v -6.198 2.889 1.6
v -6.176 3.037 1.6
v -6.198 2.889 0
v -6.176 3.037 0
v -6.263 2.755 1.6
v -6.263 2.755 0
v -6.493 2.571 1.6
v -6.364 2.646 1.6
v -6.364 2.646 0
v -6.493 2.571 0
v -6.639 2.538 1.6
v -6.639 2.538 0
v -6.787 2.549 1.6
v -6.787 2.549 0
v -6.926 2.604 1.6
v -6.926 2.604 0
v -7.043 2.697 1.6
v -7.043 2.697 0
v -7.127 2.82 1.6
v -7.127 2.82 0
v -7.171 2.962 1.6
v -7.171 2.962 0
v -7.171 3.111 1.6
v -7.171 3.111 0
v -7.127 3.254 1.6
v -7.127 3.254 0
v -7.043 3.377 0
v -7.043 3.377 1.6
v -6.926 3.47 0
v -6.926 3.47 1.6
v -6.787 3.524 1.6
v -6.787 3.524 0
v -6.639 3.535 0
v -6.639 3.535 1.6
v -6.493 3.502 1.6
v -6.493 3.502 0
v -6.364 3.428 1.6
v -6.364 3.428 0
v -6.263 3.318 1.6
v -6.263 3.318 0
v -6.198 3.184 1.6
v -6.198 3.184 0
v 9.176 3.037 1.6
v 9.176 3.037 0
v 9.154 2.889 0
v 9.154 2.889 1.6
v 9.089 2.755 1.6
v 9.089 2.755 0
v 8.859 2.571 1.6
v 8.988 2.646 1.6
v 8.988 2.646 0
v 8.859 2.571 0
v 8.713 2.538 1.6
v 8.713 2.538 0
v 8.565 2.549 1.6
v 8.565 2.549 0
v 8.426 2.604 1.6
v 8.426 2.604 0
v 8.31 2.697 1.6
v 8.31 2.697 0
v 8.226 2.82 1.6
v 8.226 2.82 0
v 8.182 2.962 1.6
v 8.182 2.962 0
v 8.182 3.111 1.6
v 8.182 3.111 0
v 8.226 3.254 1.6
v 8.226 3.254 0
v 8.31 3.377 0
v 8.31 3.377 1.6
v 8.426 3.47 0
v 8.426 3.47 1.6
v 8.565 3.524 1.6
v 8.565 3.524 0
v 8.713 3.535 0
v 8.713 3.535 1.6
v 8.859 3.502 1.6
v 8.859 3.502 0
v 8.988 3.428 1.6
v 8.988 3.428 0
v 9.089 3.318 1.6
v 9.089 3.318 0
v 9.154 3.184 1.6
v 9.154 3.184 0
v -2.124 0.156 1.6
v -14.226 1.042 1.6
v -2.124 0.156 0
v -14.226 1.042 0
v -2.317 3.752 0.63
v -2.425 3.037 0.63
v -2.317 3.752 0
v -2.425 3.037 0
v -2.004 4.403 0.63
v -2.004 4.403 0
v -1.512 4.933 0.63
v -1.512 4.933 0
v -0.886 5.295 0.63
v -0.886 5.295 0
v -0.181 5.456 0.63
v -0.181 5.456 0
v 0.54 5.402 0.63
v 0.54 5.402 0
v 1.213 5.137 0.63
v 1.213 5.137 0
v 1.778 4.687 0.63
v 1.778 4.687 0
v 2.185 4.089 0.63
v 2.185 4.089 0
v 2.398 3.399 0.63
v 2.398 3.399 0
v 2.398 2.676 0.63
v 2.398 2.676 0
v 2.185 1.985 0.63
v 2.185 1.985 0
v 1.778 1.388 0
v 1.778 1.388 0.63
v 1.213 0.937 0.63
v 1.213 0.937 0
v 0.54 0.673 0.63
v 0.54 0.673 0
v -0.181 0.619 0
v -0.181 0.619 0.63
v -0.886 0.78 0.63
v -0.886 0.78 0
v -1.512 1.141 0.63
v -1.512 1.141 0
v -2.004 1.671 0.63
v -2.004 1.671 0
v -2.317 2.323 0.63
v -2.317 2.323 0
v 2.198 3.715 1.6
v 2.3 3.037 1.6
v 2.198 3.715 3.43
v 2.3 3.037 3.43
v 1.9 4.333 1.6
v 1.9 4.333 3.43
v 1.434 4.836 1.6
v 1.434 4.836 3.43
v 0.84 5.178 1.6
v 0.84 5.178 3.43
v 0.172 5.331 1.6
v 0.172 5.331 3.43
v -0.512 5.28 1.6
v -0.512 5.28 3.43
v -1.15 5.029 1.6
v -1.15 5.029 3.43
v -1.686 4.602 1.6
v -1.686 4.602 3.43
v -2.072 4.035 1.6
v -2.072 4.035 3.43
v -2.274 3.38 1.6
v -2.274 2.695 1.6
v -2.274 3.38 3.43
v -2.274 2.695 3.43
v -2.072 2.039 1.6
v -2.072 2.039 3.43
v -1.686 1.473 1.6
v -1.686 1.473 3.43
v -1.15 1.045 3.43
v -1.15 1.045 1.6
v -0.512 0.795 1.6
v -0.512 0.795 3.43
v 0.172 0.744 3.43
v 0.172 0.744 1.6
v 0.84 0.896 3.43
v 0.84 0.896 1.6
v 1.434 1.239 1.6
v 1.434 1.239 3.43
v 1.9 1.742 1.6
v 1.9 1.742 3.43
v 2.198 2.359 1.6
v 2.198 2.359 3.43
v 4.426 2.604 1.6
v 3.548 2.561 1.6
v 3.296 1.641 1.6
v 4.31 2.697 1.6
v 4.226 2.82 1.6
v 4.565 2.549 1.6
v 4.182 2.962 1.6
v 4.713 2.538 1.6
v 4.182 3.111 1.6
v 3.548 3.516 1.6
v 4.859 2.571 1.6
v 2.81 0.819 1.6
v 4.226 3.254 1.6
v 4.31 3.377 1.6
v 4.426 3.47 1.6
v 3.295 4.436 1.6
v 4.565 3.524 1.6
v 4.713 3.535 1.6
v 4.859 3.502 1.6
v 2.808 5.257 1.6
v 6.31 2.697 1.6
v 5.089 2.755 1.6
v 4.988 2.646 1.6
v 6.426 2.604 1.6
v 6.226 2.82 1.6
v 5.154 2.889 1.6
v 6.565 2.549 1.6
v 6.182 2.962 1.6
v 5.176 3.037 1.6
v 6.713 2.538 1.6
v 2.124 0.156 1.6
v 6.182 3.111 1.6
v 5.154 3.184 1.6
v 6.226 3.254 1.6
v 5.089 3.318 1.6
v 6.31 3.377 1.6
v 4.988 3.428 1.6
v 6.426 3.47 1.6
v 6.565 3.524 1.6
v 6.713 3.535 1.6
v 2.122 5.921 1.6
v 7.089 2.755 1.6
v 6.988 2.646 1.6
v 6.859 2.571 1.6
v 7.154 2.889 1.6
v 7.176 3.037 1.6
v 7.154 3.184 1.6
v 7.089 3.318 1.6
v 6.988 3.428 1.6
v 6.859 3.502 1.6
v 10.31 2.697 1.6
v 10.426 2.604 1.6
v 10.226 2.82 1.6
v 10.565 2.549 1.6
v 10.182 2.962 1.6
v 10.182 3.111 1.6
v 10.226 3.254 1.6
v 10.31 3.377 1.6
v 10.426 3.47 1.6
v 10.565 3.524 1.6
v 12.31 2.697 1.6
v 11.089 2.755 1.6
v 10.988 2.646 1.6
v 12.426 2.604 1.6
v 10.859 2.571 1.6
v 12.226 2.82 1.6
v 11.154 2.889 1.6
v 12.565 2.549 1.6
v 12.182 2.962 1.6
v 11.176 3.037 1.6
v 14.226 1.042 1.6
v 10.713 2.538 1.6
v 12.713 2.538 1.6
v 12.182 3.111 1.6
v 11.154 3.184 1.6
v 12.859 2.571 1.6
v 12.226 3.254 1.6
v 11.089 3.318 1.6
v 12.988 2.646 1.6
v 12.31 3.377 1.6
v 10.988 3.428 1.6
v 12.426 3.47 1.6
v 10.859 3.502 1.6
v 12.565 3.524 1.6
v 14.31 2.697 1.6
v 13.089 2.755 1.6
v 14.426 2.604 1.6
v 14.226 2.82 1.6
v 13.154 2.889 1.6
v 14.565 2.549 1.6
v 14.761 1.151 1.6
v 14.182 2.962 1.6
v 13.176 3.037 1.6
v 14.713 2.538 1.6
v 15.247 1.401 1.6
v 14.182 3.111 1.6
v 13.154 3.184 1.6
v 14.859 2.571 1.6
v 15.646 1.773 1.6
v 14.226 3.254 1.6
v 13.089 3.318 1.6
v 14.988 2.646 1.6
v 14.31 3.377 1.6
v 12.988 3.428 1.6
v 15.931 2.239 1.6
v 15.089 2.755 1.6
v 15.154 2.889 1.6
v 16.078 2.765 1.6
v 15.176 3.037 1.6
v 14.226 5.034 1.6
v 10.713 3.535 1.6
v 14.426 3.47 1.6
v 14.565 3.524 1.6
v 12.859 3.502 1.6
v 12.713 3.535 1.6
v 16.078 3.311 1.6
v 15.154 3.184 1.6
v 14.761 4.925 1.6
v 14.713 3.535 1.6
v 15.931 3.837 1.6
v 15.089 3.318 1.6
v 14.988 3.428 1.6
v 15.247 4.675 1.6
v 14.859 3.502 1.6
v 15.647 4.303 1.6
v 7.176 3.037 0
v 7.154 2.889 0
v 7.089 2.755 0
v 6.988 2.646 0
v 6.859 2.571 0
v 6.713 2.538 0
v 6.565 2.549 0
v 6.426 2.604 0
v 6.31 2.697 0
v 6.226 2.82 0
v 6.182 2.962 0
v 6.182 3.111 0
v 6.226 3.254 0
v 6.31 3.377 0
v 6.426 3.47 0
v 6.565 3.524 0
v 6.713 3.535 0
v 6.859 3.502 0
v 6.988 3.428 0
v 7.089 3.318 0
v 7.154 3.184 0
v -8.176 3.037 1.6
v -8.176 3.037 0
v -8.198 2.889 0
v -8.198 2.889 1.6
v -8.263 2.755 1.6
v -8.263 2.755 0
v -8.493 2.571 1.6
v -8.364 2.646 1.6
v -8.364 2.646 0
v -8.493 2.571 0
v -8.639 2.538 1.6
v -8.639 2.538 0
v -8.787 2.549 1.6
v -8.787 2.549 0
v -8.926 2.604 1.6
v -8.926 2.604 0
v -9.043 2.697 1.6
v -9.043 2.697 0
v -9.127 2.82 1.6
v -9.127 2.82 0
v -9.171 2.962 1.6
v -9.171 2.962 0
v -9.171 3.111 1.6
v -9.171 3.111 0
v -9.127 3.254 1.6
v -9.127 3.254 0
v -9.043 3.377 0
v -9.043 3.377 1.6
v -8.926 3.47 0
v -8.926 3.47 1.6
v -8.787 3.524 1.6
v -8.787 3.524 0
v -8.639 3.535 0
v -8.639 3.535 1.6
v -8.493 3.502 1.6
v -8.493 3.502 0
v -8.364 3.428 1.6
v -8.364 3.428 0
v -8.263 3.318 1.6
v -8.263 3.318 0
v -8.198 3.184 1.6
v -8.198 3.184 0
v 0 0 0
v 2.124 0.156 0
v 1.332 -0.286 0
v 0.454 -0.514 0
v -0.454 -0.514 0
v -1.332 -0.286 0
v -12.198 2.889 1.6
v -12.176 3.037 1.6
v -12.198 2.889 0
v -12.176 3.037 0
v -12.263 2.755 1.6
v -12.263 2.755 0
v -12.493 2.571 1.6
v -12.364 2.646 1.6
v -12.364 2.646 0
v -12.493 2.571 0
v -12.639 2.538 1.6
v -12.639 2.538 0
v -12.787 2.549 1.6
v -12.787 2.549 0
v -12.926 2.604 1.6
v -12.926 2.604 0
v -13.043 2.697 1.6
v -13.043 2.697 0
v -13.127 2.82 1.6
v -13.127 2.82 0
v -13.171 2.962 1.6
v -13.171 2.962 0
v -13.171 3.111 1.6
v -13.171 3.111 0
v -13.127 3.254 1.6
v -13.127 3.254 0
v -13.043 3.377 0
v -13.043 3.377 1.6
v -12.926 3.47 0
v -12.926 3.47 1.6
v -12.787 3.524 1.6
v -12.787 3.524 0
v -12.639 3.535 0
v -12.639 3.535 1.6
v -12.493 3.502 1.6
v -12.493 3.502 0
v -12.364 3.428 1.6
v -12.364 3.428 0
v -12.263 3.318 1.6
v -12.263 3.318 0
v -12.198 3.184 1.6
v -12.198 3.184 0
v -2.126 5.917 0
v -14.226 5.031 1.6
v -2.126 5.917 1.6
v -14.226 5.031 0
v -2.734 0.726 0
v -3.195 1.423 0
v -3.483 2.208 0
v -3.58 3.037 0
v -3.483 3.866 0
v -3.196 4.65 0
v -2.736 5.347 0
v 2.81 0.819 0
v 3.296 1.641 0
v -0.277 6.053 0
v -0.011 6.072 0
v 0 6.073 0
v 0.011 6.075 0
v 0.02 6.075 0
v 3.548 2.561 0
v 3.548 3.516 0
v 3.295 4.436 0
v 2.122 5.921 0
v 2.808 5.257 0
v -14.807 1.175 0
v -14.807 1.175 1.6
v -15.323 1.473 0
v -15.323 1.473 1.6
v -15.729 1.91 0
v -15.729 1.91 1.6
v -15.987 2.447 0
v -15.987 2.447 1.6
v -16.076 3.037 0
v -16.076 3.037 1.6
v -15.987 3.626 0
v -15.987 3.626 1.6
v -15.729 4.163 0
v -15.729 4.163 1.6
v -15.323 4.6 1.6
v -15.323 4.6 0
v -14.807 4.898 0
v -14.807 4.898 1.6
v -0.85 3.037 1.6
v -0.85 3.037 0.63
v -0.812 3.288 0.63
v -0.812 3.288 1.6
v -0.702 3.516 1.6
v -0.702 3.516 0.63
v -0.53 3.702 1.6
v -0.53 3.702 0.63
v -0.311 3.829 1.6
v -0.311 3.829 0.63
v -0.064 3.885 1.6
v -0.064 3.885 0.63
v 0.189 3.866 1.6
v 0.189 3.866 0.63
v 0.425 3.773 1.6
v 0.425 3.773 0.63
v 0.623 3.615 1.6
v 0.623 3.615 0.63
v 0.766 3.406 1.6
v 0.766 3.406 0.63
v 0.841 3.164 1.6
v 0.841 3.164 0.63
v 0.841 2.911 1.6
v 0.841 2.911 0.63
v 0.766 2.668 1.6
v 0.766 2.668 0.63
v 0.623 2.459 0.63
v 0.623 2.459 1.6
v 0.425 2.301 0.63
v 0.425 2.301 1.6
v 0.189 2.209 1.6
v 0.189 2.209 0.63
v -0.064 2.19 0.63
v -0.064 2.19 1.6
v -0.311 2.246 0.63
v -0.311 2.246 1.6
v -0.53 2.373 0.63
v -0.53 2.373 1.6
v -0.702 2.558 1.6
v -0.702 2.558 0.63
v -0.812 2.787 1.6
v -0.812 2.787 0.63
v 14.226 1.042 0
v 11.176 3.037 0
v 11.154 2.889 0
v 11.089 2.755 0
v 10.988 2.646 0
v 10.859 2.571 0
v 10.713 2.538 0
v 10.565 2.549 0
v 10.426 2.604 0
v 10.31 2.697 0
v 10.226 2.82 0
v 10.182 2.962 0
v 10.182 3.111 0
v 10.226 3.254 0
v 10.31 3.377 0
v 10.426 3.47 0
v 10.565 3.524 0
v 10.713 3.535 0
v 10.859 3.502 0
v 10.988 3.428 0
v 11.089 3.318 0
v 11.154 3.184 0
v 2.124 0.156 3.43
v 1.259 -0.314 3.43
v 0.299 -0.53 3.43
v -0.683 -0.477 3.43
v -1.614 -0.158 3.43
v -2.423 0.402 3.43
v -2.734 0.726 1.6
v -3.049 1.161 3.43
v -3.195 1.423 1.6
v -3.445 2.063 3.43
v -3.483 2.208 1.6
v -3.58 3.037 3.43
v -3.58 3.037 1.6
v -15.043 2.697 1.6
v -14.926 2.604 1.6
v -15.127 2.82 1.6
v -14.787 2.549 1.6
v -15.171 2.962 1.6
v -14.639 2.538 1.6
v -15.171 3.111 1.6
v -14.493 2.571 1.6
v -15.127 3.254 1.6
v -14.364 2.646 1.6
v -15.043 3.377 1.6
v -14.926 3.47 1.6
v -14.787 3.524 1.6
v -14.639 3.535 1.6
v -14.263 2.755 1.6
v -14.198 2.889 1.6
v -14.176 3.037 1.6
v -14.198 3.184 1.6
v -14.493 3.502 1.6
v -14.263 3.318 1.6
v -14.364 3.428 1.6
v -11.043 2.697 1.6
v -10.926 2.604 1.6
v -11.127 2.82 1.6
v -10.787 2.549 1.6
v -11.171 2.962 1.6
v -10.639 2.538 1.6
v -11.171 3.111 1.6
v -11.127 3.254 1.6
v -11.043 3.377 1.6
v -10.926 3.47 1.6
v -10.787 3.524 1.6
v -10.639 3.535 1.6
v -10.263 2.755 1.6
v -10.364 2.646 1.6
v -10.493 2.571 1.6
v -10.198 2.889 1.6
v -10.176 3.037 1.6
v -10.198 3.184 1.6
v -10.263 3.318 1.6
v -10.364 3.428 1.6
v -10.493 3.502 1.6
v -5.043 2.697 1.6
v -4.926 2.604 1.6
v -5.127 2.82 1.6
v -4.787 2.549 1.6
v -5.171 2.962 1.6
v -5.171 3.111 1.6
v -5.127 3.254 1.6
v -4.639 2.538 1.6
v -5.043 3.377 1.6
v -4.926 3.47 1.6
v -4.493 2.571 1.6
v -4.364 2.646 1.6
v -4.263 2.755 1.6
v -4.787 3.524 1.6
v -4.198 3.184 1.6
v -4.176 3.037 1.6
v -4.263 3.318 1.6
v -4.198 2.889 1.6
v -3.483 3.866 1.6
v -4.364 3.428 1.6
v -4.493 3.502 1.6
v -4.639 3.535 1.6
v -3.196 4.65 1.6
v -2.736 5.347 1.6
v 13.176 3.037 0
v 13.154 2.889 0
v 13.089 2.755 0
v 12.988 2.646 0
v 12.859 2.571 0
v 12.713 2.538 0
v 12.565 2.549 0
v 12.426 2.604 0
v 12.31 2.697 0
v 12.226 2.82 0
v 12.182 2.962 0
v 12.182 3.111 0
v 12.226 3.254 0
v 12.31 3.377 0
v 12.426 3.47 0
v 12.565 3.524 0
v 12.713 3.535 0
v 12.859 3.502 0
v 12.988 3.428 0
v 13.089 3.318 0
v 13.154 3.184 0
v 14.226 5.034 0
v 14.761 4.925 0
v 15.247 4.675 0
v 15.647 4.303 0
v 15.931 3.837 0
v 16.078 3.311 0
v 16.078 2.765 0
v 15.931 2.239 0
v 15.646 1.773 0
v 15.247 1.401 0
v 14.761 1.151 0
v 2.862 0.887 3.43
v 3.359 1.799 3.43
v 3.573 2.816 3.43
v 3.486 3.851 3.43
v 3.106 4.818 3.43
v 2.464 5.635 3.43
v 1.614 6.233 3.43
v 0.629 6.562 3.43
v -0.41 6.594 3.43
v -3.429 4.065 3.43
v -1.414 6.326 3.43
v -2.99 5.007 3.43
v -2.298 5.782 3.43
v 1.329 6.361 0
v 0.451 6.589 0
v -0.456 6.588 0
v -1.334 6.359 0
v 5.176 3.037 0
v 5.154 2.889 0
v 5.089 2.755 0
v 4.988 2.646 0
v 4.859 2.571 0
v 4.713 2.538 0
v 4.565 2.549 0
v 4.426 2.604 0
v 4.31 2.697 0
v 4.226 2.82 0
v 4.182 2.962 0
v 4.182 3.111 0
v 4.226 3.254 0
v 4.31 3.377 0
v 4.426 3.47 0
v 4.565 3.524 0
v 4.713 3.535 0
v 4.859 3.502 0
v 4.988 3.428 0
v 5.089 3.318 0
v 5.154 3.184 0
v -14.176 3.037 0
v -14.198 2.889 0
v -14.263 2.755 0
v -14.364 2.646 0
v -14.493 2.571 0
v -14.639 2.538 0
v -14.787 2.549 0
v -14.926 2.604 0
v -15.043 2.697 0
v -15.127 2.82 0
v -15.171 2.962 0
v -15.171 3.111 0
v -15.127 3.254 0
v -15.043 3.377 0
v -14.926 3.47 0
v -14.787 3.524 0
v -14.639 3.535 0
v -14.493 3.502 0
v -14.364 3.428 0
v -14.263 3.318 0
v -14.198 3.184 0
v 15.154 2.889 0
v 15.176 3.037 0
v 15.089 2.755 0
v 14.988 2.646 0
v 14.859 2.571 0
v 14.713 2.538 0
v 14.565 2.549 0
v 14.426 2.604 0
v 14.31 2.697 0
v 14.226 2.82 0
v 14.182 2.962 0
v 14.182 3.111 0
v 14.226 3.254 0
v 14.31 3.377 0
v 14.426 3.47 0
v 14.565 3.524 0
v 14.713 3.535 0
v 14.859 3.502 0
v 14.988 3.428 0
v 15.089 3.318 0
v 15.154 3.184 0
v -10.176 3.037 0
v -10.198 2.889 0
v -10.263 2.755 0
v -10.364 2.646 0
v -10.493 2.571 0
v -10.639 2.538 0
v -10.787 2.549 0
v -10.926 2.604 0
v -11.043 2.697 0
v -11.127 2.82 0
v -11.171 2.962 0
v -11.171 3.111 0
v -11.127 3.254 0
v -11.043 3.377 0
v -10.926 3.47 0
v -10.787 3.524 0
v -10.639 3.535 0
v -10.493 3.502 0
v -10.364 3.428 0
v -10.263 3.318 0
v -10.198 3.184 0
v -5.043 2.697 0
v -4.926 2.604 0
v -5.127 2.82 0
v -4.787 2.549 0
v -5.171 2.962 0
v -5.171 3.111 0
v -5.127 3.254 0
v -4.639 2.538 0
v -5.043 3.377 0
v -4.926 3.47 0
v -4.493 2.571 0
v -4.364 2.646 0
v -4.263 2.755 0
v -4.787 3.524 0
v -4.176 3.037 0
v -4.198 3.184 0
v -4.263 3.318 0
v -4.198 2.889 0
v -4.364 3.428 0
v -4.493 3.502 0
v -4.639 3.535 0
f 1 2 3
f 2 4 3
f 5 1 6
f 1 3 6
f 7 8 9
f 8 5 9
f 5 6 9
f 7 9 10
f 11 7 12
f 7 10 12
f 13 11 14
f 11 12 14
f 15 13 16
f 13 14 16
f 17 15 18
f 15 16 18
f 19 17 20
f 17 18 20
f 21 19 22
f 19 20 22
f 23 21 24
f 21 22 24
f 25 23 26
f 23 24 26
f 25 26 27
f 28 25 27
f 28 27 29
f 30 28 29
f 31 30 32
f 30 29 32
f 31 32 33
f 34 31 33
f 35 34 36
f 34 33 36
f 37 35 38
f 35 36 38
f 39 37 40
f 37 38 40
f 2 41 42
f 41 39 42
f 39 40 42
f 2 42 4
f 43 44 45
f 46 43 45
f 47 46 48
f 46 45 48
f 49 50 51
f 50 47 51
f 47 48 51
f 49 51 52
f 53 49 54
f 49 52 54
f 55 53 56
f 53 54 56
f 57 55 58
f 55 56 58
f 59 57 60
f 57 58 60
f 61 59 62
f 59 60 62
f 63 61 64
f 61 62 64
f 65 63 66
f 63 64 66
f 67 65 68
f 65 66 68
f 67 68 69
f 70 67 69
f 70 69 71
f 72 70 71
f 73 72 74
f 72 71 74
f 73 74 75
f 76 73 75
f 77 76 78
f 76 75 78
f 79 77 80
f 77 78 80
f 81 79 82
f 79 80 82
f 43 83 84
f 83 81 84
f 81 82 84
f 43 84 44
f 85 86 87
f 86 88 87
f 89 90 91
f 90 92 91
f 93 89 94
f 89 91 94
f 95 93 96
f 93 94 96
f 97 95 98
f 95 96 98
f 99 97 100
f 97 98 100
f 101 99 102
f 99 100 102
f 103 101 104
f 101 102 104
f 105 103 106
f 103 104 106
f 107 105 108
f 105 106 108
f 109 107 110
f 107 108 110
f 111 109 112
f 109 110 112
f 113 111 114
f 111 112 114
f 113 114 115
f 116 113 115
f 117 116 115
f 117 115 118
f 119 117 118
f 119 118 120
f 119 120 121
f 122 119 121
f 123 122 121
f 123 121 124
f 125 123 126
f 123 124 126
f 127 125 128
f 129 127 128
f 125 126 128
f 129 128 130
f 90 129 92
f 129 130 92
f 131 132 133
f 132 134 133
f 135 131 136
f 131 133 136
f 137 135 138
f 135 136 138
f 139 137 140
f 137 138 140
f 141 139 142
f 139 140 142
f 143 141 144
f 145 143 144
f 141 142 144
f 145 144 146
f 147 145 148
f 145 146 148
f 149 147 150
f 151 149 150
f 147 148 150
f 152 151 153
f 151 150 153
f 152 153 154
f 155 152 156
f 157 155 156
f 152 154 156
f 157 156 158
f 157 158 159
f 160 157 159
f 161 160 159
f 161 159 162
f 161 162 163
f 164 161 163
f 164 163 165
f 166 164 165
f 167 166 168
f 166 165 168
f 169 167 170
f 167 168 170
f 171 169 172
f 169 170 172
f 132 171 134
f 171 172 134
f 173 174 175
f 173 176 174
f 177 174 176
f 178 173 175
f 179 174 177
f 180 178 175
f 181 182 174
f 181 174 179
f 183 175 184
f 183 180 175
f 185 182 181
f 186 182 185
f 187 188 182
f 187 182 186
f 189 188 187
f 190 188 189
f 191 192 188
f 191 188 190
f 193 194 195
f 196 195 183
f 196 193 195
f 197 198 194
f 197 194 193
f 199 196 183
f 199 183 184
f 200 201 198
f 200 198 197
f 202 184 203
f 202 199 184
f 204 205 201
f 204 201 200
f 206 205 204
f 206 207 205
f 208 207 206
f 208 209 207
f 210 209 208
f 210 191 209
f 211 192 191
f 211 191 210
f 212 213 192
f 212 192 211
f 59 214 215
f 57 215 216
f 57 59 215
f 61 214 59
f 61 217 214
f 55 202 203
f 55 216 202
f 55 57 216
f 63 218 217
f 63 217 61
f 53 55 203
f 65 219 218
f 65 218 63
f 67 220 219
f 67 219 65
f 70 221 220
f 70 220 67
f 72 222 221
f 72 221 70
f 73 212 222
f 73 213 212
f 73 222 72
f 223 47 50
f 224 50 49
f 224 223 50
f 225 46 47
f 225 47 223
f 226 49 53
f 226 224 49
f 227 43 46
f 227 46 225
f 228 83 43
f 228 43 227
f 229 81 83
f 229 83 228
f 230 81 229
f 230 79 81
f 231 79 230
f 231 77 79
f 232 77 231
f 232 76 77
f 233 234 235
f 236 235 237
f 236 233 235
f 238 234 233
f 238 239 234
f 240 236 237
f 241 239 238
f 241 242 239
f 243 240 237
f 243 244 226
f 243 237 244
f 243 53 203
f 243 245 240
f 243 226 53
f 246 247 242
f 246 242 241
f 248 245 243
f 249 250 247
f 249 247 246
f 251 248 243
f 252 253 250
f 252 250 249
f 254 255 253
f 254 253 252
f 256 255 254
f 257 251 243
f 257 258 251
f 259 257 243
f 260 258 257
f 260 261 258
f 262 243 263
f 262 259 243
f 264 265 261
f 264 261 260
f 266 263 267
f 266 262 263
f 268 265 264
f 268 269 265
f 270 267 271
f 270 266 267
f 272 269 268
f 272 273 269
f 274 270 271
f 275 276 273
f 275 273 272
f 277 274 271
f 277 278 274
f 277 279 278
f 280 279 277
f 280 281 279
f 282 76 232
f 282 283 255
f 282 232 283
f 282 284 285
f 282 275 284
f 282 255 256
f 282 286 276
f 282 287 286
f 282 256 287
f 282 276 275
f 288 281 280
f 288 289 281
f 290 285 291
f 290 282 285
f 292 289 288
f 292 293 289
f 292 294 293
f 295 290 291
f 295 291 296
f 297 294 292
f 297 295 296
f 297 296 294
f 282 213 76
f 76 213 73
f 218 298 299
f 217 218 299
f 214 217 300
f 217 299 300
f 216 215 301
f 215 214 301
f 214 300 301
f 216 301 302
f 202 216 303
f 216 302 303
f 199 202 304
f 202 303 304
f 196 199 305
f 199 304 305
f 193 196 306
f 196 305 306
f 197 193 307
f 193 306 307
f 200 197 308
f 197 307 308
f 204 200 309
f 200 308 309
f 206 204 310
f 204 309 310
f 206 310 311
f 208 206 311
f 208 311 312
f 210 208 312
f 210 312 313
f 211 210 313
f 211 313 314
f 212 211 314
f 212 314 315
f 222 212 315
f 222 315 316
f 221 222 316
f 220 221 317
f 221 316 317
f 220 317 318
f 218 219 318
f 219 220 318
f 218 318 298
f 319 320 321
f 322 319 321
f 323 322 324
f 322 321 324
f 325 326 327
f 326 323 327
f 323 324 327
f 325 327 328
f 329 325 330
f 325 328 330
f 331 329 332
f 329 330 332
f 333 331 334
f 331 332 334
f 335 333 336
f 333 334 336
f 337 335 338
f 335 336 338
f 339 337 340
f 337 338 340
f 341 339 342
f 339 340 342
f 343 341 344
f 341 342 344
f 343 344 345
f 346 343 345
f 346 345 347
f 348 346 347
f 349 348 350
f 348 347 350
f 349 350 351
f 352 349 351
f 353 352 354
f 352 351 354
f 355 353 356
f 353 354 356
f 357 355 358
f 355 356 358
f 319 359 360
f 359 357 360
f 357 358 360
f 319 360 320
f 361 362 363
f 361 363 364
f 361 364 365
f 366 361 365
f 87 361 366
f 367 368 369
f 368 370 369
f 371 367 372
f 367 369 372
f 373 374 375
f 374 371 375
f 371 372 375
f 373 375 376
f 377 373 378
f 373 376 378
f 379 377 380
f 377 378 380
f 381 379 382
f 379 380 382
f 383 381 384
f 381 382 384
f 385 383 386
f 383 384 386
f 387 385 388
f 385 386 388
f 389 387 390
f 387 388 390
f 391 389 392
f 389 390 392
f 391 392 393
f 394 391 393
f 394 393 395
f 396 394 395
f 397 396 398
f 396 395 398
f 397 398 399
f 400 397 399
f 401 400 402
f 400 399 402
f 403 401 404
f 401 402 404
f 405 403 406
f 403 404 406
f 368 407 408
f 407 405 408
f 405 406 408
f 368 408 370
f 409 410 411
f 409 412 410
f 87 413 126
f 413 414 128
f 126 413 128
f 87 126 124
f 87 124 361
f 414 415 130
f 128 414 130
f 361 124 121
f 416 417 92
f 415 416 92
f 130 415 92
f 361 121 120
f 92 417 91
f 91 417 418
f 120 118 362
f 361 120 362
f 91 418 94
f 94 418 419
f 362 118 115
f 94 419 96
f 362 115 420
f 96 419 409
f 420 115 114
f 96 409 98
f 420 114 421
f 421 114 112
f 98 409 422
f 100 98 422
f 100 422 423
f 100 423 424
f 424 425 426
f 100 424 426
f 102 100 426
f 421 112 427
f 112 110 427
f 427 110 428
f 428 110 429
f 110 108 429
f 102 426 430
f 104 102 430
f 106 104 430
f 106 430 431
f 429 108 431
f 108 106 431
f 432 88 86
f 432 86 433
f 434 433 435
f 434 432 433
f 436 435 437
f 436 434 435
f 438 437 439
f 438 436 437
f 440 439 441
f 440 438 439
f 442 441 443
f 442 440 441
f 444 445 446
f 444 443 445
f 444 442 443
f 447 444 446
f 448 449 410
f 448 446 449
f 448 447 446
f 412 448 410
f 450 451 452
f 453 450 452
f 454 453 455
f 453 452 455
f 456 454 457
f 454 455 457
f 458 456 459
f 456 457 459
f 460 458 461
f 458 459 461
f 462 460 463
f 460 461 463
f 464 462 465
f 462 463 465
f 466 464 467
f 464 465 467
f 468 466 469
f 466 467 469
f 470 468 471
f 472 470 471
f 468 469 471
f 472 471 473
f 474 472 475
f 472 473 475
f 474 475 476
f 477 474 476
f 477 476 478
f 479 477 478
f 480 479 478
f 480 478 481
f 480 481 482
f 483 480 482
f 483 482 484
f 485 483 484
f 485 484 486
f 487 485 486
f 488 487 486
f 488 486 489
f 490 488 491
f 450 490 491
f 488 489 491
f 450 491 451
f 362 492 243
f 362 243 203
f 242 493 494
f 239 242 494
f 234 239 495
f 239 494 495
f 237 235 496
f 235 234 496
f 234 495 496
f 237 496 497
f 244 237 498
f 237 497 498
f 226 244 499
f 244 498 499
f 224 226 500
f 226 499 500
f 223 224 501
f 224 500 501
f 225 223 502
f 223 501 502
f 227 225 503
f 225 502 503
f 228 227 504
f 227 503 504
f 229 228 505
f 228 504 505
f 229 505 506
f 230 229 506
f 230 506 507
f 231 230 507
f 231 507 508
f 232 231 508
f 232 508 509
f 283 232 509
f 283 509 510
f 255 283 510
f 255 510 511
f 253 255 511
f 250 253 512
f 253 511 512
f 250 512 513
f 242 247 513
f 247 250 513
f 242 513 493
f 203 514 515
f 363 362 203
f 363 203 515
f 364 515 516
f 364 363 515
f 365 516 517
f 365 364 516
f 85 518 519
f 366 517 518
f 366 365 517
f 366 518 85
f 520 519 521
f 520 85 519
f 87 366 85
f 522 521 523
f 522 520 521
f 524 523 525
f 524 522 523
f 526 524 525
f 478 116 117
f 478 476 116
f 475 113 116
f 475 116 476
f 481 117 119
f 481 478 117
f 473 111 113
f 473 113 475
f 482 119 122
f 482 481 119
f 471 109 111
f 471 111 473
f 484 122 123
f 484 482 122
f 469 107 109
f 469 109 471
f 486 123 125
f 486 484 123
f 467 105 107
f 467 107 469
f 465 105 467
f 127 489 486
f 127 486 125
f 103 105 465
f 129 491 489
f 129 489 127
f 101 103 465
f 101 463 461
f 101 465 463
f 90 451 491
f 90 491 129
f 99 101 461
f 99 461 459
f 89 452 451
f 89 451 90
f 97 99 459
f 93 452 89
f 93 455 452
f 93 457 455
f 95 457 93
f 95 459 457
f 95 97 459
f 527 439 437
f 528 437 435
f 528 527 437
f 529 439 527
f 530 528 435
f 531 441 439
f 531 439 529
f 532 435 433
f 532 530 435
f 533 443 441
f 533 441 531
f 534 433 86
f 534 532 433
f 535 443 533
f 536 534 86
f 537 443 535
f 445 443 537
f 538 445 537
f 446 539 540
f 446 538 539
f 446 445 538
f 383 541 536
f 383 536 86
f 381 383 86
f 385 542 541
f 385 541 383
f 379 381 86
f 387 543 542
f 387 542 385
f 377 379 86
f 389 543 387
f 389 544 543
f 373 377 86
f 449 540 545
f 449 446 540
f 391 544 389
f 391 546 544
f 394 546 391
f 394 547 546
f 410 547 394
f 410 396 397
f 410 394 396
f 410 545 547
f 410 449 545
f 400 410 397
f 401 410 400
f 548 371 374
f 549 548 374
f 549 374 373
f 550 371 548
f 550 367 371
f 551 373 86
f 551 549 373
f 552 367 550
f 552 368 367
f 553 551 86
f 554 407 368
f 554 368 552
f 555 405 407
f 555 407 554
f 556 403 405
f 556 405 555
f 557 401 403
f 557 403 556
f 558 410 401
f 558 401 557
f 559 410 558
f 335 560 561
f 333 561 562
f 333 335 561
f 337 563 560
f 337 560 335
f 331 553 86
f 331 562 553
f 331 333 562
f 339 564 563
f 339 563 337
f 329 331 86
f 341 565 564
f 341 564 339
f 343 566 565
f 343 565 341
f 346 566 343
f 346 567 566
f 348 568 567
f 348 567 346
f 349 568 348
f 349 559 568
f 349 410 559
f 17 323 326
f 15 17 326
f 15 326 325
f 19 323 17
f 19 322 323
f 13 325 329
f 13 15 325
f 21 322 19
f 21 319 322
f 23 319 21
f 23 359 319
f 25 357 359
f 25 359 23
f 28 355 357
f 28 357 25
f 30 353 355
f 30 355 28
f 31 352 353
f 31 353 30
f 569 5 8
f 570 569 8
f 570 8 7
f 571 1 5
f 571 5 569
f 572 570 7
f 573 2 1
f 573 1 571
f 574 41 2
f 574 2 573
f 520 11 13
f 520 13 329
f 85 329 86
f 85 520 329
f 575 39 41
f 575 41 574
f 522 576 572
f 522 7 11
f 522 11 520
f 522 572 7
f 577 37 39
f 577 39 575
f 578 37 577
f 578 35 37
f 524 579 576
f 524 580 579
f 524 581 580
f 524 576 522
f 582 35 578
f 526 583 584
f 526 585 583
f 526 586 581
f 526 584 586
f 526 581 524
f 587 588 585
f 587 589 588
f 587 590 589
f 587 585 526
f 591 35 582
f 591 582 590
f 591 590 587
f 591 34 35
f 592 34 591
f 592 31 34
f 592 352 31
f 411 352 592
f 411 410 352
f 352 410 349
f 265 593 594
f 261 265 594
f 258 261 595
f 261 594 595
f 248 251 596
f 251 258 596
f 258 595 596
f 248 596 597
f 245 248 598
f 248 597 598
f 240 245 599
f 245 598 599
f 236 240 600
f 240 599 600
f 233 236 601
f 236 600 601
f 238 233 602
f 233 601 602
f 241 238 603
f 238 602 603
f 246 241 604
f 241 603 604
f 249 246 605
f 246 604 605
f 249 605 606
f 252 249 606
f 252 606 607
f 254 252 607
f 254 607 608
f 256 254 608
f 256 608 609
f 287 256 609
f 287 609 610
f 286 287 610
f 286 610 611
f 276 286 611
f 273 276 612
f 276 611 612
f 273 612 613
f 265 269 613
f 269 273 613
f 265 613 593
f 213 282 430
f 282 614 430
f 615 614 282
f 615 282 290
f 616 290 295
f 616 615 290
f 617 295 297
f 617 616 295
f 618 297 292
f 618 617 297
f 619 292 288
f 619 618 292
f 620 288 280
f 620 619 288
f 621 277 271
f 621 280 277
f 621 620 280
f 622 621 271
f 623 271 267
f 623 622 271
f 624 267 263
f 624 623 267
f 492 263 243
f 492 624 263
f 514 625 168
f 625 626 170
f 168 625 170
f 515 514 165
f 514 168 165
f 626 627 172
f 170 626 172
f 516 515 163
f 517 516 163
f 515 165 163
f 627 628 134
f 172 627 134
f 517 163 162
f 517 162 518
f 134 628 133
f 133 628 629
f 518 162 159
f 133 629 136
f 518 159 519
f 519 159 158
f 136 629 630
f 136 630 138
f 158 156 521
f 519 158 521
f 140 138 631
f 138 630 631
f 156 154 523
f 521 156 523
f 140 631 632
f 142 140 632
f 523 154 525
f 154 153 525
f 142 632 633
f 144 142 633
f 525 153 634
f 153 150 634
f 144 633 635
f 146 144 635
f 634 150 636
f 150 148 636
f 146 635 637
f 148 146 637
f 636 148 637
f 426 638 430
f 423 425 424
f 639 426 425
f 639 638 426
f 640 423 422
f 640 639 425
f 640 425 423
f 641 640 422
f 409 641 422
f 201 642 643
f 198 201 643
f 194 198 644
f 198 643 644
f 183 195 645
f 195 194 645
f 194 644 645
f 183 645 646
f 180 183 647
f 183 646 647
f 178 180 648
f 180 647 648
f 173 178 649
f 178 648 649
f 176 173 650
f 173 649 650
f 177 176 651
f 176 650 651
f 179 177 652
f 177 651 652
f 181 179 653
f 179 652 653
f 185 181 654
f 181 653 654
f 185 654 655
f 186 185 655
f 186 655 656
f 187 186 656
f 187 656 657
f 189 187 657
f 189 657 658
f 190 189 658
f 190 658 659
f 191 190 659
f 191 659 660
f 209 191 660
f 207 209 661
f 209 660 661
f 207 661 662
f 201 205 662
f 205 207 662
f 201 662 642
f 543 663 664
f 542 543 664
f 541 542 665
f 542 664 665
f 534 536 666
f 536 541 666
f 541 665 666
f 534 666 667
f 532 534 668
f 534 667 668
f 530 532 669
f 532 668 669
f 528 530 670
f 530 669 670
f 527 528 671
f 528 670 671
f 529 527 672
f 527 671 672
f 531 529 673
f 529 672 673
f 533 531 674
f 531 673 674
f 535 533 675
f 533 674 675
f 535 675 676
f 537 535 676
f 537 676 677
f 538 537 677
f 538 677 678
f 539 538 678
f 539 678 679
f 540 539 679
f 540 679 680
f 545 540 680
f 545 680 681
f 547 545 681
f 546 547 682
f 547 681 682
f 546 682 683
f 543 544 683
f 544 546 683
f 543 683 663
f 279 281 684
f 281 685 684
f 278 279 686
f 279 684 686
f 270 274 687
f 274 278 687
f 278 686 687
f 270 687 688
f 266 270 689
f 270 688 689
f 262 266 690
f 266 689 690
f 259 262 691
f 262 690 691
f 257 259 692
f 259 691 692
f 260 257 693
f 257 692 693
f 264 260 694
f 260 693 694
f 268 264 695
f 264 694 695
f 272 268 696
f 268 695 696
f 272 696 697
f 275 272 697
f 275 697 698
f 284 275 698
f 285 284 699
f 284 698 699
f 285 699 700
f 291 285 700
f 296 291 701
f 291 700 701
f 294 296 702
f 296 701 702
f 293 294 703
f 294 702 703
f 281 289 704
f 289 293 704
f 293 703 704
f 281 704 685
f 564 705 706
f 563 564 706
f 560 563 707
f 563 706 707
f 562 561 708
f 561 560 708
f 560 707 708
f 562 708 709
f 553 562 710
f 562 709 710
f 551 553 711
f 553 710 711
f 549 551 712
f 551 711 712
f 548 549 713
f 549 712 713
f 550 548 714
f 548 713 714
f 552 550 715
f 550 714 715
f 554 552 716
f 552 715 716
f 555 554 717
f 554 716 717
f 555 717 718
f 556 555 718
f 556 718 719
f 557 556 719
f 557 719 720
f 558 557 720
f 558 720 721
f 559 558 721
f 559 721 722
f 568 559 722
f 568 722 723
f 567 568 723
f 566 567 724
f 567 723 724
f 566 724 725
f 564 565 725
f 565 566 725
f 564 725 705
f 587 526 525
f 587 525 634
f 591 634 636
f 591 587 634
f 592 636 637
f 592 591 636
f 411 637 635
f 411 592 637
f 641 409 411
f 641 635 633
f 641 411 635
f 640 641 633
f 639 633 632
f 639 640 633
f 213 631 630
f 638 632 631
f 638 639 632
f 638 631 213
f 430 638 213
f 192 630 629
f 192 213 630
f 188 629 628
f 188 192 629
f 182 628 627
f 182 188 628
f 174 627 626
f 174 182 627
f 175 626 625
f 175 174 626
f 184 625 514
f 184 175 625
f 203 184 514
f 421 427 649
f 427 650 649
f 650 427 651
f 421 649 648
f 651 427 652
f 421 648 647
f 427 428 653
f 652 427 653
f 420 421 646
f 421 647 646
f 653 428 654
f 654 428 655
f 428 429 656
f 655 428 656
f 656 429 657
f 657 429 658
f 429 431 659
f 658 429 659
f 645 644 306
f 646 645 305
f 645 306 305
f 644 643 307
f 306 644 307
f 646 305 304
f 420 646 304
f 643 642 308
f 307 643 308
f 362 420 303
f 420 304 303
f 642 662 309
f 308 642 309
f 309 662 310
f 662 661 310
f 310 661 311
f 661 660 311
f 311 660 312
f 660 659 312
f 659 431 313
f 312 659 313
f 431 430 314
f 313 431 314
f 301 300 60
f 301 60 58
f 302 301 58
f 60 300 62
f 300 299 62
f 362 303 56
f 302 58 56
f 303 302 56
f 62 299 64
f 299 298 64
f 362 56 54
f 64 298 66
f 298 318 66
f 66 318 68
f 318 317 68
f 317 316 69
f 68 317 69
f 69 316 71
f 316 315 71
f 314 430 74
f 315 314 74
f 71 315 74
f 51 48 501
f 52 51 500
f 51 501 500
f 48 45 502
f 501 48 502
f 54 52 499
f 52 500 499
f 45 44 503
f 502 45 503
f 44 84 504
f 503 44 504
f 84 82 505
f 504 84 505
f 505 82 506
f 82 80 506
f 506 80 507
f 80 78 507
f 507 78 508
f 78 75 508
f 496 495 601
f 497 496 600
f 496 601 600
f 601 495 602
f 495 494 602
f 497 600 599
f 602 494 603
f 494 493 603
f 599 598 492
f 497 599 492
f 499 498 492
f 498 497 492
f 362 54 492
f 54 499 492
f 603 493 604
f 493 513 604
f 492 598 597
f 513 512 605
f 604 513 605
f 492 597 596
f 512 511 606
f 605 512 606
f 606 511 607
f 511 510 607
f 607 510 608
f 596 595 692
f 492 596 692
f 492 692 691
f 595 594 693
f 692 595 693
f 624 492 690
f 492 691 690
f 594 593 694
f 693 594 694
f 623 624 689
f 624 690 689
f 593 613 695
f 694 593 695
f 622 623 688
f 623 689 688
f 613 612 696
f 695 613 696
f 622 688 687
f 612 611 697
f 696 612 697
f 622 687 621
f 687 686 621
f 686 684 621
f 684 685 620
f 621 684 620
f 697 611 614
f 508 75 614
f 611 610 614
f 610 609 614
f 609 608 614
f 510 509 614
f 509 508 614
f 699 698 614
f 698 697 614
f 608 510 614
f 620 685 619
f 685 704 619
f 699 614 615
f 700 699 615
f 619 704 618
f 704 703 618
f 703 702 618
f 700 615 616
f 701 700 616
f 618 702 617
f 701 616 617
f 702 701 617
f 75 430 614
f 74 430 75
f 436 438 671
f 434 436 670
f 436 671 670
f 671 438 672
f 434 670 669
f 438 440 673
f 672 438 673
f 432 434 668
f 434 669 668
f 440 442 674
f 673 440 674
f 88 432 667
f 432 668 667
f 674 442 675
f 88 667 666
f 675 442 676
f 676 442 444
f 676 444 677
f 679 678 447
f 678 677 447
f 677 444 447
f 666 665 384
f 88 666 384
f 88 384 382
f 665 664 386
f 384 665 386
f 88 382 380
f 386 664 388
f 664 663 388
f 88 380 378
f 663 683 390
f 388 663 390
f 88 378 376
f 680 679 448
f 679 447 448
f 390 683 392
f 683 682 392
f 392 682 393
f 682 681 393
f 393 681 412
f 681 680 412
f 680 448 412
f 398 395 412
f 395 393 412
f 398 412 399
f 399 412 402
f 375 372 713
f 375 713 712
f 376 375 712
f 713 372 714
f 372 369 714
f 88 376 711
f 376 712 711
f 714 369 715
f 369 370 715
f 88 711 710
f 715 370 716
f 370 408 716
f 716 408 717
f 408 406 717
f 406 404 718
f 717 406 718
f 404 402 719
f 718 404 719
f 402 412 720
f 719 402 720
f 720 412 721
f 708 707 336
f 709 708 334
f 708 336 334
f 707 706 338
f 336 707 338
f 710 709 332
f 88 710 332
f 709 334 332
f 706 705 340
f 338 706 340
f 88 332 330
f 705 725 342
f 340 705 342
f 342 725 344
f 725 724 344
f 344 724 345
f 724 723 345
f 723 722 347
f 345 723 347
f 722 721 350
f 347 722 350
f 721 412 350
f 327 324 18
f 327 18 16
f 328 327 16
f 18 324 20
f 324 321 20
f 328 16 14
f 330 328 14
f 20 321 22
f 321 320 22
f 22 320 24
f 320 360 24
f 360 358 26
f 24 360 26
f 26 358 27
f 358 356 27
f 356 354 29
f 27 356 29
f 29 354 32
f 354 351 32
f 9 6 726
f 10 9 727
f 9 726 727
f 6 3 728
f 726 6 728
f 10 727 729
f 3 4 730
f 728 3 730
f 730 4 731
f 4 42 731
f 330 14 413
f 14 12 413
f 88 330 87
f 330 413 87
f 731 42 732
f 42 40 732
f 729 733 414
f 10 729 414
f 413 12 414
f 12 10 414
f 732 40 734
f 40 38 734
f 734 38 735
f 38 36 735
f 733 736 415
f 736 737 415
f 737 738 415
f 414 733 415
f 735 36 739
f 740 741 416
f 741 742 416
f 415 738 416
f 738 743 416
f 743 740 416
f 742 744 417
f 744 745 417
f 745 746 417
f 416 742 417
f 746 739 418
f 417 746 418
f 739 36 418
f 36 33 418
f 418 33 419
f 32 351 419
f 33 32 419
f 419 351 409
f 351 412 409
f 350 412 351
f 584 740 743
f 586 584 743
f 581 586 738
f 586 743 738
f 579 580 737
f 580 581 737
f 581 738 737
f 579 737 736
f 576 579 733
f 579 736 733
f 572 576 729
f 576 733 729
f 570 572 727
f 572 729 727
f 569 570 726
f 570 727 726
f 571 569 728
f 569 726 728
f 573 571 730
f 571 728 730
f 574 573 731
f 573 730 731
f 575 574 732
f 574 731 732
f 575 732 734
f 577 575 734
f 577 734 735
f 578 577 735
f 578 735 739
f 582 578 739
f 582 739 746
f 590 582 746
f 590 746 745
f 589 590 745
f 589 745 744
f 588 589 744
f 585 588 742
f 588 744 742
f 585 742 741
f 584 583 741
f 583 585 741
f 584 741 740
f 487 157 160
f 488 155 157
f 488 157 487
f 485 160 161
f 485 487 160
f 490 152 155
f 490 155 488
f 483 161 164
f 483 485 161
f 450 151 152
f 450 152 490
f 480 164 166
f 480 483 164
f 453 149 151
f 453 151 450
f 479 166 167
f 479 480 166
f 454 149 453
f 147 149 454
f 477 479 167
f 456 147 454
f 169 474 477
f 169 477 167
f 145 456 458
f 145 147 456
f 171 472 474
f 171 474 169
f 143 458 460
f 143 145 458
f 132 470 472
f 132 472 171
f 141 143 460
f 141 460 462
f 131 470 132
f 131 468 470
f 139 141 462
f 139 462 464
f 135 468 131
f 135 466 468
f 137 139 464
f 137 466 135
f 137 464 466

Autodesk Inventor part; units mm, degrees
ref_plane "YZ Plane" through (0, 0, 0) normal (1, 0, 0) x (0, 1, 0)
ref_plane "XZ Plane" through (0, 0, 0) normal (0, 1, 0) x (-1, 0, 0)
ref_plane "XY Plane" through (0, 0, 0) normal (0, 0, 1) x (1, 0, 0)
sketch "Boceto1" plane through (0, 0, 0) normal (0, 0, 1) x (1, 0, 0)
  arc A0 (-14.2261, 5.0309) -> (-14.2261, 1.0422) centre (-14.0761, 3.0366) ccw
  line L0 (-14.2261, 5.0309) -> (-0.0106, 6.0724)
  line L1 (-14.2261, 1.0422) -> (0, 0)
  circle A1 centre (-14.6761, 3.0366) radius 0.5
  circle A2 centre (-12.6761, 3.0366) radius 0.5
  circle A3 centre (-10.6761, 3.0366) radius 0.5
  circle A4 centre (-8.6761, 3.0366) radius 0.5
  circle A5 centre (-6.6761, 3.0366) radius 0.5
  circle A6 centre (-4.6761, 3.0366) radius 0.5
  line L2 (-0.2768, 6.0529) -> (0, 6.0731)
  arc A7 (14.2261, 1.0422) -> (14.2264, 5.0339) centre (14.0972, 3.038) ccw
  line L3 (14.2264, 5.0339) -> (0.0108, 6.0753)
  line L4 (14.2261, 1.0422) -> (0, 0)
  circle A8 centre (14.6761, 3.0366) radius 0.5
  circle A9 centre (12.6761, 3.0366) radius 0.5
  circle A10 centre (10.6761, 3.0366) radius 0.5
  circle A11 centre (8.6761, 3.0366) radius 0.5
  circle A12 centre (6.6761, 3.0366) radius 0.5
  circle A13 centre (4.6761, 3.0366) radius 0.5
  line L5 (0, 6.0731) -> (0.0201, 6.0746)
  point P0 (0, 0)
  dimension "d10" = 2
  dimension "d13" = 10
extrude "Extrusión1" add sketch "Boceto1" along normal blind 1.6
sketch "Boceto2" plane through (0, 0, 0) normal (0, 0, -1) x (-1, 0, 0)
  line L0 (0, 0) -> (-14.2261, 1.0422) projected
  circle A0 centre (0, 3.0373) radius 3.58
  point P0 (-0.0201, 6.0746)
extrude "Extrusión2" add sketch "Boceto2" against normal blind 3.43
sketch "Boceto3" plane through (0, 0, 0) normal (0, 0, -1) x (-1, 0, 0)
  arc A0 (2.1264, 5.9174) -> (-2.122, 5.9206) centre (0, 3.0373) ccw projected
  circle A1 centre (0, 3.0373) radius 2.425
  point P0 (0, 0)
extrude "Extrusión3" cut sketch "Boceto3" against normal blind 0.63
sketch "Boceto4" plane through (0, 3.0373, 0.63) normal (0, 0, -1) x (-1, 0, 0)
  circle A0 centre (0, 0) radius 0.85
  point P0 (0, -3.0373)
extrude "Extrusión4" cut sketch "Boceto4" against normal through all
sketch "Boceto5" plane through (0, 3.0373, 3.43) normal (0, 0, 1) x (1, 0, 0)
  circle A0 centre (0, 0) radius 2.3
  point P0 (0, -3.0373)
extrude "Extrusión5" cut sketch "Boceto5" against normal blind 1.83
equation "\"Radio_pliegue\" = Grosor"
equation "\"Anchura_desahogo_plegado\" = Grosor"
equation "\"Profundidad_desahogo_plegado\" = 0.5 * Grosor"
equation "\"Tamaño_destalonado\" = 4 * Grosor"
equation "\"Remanente_mínimo\" = 2 * Grosor"
equation "\"Radiodetransición\" = Radio_pliegue"
equation "\"Tamaño_de_radio_de_Jacobi\" = Radio_pliegue"
equation "\"TamañoSeparación\" = Grosor"
equation "\"Grosor\" = 0.5"
properties part number "cosito servo"
